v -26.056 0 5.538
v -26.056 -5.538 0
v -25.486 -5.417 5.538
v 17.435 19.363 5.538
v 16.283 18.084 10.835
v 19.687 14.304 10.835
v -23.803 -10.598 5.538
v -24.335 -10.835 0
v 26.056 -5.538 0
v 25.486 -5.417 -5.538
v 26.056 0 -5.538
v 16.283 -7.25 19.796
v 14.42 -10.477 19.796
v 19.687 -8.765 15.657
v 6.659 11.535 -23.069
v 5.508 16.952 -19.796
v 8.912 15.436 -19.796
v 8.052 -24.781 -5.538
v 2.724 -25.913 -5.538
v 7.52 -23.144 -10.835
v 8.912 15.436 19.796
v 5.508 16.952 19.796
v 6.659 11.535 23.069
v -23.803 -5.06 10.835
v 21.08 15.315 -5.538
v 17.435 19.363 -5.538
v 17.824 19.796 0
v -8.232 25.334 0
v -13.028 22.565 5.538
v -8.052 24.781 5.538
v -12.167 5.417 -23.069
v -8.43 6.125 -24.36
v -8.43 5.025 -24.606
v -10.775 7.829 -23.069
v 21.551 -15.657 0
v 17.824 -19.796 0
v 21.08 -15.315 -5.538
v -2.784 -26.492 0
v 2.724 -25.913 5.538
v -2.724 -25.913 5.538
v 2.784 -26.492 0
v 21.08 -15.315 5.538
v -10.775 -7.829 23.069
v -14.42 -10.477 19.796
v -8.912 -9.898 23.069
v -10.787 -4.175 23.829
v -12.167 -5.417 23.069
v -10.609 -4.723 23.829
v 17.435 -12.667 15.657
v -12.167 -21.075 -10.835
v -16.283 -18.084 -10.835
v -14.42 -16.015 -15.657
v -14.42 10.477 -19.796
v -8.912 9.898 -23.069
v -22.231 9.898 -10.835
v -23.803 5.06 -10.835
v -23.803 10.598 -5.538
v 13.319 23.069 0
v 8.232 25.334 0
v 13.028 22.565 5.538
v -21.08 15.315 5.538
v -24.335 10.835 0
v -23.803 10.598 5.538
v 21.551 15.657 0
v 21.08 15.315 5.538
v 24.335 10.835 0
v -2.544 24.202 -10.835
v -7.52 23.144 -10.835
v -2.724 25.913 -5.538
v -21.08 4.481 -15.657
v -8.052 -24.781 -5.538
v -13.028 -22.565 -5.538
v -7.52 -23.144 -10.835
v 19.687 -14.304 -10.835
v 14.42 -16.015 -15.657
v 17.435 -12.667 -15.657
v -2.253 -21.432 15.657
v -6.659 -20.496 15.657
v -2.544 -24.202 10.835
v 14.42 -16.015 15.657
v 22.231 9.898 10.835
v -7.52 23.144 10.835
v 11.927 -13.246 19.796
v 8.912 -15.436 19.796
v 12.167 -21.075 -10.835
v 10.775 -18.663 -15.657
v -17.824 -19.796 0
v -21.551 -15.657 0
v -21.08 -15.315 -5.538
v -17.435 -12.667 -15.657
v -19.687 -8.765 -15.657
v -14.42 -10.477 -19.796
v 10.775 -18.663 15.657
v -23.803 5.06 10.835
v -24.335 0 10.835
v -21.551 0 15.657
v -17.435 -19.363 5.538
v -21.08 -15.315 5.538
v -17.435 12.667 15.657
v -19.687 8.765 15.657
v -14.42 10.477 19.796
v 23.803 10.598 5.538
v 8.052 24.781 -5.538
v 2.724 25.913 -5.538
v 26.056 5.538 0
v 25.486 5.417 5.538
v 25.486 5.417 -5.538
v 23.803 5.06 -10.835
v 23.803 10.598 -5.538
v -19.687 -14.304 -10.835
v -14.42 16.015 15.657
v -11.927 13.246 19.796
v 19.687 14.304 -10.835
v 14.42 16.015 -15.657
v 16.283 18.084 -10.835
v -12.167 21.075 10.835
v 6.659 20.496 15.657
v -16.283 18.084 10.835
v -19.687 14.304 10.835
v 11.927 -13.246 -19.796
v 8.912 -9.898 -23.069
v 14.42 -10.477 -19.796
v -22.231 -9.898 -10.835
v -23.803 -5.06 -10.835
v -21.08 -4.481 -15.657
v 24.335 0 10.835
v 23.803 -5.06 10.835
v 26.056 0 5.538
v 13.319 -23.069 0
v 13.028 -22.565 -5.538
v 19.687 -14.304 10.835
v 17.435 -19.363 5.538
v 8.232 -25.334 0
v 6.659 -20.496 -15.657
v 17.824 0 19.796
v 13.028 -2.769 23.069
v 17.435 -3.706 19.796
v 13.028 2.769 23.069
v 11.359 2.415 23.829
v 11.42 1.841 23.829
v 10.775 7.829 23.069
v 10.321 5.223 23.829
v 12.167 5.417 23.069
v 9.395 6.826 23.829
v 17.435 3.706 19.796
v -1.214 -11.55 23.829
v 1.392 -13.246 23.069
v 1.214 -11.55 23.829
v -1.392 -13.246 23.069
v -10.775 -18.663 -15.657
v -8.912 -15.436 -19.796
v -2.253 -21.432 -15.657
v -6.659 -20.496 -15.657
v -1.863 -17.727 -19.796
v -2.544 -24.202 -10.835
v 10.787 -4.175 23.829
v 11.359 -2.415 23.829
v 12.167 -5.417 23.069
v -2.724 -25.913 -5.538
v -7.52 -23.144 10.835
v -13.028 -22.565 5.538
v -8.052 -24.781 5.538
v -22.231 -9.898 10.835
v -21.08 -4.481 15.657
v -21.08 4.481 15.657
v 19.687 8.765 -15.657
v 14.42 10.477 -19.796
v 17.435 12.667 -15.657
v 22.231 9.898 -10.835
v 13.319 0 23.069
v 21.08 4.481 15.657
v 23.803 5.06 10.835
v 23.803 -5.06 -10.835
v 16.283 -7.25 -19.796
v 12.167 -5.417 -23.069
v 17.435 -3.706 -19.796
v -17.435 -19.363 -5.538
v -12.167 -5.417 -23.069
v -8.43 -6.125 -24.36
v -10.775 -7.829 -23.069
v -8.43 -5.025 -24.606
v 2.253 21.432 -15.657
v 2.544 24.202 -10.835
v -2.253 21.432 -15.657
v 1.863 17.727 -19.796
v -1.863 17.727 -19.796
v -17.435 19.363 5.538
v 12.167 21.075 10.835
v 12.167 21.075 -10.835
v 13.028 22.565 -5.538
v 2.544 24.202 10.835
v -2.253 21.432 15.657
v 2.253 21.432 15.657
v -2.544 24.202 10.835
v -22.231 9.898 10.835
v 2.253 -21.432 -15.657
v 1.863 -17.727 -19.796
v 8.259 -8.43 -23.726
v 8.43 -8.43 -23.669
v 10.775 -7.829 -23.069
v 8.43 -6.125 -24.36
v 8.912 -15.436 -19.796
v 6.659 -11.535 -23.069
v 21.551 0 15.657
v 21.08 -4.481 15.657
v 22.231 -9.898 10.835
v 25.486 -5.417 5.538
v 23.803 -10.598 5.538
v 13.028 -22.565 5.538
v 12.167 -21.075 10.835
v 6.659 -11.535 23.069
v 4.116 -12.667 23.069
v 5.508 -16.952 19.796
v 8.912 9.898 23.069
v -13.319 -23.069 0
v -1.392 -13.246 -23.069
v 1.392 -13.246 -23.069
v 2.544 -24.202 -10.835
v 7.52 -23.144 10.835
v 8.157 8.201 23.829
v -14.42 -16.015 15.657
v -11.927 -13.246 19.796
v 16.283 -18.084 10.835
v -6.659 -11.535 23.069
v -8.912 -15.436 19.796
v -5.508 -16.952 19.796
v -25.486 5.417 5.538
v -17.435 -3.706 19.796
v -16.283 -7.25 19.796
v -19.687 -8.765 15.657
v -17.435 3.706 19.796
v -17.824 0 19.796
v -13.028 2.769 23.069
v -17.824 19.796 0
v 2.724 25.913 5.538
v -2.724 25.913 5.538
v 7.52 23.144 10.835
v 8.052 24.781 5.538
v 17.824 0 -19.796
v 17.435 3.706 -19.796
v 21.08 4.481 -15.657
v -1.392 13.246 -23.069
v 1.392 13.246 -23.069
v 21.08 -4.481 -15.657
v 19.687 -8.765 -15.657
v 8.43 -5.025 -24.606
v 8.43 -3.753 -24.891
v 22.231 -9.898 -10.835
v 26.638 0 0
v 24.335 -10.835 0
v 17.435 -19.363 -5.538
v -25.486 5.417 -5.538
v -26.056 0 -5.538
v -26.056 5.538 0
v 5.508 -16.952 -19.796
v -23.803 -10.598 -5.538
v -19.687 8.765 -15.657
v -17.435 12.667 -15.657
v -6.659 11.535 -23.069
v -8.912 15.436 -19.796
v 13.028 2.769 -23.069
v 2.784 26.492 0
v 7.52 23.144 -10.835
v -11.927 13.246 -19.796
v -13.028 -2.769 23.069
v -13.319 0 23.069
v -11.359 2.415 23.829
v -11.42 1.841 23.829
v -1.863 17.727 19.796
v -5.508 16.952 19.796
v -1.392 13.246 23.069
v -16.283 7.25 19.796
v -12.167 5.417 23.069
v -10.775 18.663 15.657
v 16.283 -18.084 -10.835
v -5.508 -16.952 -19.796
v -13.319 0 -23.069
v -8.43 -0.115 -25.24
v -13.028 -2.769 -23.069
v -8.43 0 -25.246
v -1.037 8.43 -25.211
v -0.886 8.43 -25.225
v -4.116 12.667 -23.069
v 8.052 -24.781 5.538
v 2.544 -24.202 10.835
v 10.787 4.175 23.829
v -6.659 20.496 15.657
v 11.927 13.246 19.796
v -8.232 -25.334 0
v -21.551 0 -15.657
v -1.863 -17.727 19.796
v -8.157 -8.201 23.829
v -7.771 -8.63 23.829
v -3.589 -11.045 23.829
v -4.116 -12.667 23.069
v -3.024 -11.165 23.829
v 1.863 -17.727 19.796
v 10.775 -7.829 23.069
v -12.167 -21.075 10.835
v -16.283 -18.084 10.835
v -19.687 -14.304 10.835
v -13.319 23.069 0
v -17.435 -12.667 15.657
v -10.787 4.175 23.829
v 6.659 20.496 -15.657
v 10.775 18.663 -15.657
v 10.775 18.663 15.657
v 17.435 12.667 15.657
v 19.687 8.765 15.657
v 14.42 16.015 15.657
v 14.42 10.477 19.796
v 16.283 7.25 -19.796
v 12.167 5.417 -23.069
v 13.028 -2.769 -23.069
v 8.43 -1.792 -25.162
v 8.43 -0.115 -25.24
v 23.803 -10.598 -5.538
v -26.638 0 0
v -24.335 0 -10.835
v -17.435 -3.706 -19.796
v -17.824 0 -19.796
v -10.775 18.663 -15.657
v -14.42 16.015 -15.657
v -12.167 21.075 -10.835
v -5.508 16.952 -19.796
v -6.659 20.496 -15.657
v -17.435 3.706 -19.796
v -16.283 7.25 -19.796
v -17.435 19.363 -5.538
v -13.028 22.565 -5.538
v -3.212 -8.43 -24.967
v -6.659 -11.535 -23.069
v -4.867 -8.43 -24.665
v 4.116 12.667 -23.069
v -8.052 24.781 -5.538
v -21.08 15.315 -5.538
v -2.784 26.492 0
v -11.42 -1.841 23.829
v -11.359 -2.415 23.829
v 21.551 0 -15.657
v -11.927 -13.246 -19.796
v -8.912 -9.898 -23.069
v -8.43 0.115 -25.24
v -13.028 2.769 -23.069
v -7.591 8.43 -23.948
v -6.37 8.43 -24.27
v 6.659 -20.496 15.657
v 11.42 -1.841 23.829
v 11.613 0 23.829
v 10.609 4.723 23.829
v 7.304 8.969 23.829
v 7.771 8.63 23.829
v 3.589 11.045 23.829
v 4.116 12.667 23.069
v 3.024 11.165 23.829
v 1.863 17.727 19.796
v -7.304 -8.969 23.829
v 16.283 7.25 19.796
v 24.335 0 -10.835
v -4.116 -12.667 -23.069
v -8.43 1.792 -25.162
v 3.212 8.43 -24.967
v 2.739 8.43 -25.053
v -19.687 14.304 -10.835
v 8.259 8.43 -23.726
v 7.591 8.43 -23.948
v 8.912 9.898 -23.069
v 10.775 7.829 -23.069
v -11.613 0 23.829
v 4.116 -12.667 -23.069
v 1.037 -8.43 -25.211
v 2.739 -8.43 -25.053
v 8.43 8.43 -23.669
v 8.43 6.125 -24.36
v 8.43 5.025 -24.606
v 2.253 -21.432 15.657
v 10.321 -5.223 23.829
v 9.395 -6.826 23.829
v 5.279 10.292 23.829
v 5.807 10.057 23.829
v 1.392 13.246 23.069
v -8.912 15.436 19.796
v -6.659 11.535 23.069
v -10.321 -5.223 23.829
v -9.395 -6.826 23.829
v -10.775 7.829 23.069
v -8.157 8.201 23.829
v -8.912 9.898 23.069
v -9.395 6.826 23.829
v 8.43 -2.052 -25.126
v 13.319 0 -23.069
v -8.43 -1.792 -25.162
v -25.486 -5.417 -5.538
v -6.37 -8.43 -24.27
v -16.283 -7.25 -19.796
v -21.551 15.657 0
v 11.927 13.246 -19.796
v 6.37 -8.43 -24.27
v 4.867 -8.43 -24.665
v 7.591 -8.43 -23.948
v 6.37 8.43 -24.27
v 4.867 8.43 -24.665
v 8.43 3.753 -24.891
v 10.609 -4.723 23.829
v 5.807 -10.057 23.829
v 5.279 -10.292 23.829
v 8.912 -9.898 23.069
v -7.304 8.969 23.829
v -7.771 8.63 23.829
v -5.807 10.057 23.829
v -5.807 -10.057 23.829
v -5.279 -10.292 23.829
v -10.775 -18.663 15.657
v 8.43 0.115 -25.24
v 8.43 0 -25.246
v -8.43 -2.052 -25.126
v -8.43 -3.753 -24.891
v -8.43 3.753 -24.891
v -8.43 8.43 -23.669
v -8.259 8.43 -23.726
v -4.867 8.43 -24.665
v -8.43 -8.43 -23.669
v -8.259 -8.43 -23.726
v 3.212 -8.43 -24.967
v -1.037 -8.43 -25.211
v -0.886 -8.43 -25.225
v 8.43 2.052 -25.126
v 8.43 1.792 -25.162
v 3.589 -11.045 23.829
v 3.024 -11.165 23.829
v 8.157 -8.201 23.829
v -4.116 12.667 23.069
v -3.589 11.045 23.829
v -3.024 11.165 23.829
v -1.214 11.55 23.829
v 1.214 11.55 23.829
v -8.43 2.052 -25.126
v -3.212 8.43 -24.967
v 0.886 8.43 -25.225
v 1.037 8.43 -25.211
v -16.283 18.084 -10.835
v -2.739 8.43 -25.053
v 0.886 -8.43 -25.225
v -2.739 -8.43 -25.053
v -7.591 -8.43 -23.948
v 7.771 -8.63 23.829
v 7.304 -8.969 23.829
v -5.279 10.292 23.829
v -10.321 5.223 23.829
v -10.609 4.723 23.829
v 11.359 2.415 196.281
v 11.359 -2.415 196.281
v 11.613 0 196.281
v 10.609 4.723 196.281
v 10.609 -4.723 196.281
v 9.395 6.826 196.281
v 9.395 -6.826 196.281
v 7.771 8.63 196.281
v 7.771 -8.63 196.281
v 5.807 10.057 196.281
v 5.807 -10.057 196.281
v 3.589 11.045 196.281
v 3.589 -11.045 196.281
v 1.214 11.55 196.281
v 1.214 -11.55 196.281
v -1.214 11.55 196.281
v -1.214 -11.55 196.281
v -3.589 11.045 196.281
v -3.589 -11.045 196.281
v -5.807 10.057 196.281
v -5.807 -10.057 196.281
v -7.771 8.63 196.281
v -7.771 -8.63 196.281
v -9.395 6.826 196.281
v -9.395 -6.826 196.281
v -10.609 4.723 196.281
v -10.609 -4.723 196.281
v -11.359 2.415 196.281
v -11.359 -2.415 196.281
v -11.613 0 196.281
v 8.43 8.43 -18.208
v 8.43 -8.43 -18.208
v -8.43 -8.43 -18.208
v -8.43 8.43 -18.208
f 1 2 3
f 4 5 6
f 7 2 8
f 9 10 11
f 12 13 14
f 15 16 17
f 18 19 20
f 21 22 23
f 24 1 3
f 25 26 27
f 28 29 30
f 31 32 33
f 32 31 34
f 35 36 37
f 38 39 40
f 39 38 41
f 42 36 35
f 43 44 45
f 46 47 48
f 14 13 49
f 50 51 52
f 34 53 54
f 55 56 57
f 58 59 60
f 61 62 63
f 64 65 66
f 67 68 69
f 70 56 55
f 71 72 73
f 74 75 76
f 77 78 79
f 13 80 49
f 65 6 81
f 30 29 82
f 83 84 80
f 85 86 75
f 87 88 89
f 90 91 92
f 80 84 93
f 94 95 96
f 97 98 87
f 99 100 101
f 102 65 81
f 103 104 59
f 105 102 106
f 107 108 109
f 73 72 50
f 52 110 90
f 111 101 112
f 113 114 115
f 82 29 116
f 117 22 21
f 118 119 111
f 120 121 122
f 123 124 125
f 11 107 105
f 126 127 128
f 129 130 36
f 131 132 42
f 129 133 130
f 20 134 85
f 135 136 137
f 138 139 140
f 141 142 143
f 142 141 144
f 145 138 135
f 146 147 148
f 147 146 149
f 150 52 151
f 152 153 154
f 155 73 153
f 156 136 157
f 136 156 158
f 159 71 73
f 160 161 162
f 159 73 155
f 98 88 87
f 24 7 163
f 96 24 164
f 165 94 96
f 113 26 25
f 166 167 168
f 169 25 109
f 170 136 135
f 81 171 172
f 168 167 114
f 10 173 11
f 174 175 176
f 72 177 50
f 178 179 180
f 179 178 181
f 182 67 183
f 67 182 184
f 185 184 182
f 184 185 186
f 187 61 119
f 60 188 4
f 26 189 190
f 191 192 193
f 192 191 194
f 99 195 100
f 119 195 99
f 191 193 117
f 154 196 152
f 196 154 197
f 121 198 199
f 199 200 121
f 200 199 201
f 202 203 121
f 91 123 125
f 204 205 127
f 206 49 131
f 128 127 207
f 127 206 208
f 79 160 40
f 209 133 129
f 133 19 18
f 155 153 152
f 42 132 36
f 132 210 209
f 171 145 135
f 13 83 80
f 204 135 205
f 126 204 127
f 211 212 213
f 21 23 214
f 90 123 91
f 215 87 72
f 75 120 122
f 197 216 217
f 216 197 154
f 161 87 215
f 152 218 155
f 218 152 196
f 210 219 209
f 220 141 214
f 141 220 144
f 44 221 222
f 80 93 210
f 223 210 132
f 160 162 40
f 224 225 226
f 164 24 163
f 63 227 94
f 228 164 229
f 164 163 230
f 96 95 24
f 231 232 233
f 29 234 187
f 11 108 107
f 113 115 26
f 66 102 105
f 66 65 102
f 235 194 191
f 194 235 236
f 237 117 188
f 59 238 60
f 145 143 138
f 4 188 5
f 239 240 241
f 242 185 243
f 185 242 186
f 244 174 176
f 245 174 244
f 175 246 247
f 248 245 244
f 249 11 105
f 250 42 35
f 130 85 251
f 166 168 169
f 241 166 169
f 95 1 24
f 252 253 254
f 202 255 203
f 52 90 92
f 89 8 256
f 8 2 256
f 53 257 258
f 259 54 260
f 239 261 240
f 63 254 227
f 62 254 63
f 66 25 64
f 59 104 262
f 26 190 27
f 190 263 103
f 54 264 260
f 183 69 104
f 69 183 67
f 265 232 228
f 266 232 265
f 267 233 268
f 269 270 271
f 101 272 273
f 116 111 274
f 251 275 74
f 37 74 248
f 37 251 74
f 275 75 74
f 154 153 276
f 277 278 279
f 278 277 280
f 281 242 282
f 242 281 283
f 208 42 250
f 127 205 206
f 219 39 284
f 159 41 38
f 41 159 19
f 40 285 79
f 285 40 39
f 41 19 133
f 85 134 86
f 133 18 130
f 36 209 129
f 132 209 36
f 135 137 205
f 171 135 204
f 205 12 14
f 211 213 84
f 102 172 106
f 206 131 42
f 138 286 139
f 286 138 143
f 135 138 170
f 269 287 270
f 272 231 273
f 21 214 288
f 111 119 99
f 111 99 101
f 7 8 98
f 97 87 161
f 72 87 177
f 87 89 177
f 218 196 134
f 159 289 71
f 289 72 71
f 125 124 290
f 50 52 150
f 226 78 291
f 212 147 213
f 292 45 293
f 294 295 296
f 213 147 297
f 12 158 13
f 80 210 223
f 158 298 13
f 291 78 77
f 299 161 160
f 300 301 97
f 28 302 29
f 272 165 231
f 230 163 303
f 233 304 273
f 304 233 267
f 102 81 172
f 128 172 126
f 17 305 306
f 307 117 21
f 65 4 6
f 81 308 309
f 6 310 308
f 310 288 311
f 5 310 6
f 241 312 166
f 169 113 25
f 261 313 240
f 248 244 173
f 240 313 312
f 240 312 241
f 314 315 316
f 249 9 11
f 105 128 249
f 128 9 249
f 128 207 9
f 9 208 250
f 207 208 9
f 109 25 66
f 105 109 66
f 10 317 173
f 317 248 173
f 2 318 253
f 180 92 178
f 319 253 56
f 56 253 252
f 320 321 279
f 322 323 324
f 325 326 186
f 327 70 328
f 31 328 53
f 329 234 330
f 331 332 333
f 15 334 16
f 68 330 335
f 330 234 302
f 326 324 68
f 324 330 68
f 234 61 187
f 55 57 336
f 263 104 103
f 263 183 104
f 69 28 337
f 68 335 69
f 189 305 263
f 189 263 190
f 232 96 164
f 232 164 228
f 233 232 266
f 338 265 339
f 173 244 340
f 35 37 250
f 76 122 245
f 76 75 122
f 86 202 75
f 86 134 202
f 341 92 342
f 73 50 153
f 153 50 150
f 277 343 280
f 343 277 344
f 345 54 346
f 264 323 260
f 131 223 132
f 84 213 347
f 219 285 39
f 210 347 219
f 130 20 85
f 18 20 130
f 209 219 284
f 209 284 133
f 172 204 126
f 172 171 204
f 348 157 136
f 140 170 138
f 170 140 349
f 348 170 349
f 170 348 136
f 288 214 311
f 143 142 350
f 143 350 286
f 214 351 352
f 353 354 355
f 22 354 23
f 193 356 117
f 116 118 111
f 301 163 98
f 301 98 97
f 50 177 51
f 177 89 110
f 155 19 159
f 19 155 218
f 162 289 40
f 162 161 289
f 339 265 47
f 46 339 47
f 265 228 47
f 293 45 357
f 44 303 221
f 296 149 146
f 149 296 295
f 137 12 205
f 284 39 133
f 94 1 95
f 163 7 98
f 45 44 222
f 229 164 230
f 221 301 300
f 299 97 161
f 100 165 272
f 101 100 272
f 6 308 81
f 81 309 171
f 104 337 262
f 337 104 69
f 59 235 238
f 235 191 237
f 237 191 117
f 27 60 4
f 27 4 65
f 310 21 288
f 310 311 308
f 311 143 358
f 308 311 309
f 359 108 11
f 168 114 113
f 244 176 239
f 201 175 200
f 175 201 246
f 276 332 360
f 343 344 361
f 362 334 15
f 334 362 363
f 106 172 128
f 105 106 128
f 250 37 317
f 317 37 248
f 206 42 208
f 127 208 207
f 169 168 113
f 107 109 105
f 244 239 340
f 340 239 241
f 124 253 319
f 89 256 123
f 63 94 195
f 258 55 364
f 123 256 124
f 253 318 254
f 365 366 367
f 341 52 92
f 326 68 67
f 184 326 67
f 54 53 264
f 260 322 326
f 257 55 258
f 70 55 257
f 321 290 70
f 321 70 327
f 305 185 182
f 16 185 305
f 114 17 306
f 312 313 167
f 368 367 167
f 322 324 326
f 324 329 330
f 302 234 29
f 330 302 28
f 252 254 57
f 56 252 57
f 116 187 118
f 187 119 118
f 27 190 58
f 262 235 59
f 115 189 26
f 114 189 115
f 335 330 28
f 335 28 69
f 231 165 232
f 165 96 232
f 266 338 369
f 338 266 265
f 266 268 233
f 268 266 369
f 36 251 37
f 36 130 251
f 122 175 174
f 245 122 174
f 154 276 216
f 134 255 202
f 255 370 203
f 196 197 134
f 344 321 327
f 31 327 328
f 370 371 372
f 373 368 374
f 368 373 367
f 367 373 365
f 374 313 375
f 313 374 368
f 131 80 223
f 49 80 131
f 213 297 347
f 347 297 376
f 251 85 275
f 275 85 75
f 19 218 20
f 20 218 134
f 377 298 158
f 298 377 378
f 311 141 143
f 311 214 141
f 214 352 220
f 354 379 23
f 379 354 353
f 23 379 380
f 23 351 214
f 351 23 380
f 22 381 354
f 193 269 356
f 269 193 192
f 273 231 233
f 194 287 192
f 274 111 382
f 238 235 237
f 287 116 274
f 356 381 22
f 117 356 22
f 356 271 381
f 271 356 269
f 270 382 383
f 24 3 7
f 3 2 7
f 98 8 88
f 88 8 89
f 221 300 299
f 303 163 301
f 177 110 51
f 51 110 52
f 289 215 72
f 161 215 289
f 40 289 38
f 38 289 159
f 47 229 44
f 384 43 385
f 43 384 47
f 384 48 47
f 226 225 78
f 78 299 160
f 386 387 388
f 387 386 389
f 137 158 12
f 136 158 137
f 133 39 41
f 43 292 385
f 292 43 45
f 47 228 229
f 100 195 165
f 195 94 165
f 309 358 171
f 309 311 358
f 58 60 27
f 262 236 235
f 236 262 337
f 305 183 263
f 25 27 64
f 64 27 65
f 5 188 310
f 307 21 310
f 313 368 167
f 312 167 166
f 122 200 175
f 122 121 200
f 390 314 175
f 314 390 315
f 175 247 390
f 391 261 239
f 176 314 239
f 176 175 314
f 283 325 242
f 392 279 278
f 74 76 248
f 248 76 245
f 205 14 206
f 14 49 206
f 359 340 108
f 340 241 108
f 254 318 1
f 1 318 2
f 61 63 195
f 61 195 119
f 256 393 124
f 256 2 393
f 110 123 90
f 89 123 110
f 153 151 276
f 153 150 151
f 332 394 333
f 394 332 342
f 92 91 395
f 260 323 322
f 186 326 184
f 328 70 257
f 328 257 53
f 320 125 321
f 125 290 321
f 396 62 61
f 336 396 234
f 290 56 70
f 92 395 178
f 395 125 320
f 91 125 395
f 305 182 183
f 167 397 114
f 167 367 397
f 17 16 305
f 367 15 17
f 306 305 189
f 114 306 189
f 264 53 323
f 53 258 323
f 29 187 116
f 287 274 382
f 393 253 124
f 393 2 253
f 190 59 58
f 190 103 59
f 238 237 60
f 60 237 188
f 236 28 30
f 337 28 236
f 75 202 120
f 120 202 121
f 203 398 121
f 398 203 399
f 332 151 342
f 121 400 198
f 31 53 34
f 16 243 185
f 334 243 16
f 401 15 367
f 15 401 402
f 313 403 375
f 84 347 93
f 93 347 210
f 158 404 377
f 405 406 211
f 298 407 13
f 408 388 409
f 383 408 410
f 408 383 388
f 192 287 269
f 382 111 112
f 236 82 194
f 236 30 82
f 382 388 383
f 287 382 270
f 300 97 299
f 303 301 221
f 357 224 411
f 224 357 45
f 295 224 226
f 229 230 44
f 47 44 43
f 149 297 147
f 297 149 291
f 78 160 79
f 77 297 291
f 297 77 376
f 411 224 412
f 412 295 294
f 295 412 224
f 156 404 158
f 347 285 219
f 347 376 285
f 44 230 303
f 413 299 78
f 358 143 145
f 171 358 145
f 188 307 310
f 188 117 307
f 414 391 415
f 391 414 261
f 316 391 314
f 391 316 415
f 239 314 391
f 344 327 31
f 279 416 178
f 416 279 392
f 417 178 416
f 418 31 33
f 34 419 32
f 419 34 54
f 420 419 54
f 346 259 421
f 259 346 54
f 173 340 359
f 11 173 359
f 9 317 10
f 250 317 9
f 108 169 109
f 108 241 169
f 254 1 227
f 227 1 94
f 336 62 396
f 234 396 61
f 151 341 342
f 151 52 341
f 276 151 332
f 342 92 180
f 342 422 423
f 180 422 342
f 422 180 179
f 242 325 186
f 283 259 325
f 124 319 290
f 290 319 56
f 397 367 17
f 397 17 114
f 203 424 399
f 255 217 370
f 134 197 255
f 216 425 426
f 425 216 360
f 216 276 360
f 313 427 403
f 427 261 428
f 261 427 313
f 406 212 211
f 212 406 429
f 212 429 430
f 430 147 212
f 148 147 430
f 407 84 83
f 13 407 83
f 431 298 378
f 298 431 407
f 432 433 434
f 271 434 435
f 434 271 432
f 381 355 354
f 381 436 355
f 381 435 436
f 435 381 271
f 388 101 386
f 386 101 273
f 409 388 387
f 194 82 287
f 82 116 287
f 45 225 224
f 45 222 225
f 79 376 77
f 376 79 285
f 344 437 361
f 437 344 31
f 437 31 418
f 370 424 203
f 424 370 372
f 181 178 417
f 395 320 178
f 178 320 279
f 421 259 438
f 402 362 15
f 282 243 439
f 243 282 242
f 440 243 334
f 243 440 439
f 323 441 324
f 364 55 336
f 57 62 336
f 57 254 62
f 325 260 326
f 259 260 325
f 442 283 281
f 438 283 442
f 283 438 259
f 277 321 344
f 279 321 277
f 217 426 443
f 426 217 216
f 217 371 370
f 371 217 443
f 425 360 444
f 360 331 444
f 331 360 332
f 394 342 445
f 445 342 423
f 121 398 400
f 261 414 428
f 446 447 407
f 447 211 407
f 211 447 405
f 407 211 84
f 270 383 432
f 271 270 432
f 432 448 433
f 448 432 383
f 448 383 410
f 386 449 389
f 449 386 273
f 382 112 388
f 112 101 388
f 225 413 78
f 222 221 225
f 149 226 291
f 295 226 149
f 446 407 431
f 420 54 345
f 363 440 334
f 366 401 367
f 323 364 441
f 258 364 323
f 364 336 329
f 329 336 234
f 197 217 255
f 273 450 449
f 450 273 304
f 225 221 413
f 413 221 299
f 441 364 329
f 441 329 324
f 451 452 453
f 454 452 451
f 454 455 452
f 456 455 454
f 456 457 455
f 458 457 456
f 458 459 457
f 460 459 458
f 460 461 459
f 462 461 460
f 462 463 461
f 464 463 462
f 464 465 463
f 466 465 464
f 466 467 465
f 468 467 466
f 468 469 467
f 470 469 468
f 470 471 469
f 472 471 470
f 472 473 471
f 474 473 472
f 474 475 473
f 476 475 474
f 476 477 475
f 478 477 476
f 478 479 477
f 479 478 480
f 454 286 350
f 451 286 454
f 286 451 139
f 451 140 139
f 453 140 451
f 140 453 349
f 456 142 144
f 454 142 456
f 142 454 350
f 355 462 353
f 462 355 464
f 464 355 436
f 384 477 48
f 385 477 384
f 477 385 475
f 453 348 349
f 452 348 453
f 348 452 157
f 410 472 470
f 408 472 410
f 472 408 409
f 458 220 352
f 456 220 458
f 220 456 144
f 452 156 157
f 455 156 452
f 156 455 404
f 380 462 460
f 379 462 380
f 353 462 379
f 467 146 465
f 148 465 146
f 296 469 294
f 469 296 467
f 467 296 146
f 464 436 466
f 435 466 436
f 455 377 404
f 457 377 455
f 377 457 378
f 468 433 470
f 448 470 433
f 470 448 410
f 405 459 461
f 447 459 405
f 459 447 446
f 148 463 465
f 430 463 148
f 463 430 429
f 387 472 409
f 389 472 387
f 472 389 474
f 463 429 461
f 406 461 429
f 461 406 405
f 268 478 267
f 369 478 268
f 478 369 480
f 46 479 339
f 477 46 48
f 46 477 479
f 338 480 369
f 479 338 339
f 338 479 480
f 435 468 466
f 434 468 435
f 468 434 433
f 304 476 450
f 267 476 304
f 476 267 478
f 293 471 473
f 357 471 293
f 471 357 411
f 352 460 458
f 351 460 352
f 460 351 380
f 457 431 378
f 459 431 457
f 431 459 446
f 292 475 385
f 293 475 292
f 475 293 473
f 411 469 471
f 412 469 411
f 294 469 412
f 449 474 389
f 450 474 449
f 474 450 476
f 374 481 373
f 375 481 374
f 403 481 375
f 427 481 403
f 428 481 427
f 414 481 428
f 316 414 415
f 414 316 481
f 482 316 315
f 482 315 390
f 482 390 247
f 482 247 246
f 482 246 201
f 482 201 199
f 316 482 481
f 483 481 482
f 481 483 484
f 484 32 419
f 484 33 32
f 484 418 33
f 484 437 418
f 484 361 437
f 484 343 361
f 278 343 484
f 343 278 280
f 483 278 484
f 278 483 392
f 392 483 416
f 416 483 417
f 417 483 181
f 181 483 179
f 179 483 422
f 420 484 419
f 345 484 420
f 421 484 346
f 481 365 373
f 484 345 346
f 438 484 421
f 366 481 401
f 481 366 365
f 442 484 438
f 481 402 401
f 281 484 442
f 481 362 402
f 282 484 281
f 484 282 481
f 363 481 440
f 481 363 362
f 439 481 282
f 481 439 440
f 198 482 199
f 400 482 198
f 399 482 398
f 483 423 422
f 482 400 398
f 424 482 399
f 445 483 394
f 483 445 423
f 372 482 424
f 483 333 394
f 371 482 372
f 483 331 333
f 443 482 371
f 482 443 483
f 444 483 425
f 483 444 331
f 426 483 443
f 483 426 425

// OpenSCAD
seed = 11;
seeds = rands(0,1000000,10,seed);
head_size = rands(25,50,1,seeds[1])[0];
bolt_length = rands(head_size*2,200,1,seeds[3])[0];
bolt_radius = rands(head_size/3, head_size/2,1,seeds[0])[0];
cube_size = rands(head_size/3, head_size*0.85,1, seeds[4])[0];

difference(){
    union(){
        sphere(head_size);
        cylinder(bolt_length,bolt_radius,bolt_radius);
    }
    translate([0,0,-head_size]){
        cube(cube_size, true);
    }
}
